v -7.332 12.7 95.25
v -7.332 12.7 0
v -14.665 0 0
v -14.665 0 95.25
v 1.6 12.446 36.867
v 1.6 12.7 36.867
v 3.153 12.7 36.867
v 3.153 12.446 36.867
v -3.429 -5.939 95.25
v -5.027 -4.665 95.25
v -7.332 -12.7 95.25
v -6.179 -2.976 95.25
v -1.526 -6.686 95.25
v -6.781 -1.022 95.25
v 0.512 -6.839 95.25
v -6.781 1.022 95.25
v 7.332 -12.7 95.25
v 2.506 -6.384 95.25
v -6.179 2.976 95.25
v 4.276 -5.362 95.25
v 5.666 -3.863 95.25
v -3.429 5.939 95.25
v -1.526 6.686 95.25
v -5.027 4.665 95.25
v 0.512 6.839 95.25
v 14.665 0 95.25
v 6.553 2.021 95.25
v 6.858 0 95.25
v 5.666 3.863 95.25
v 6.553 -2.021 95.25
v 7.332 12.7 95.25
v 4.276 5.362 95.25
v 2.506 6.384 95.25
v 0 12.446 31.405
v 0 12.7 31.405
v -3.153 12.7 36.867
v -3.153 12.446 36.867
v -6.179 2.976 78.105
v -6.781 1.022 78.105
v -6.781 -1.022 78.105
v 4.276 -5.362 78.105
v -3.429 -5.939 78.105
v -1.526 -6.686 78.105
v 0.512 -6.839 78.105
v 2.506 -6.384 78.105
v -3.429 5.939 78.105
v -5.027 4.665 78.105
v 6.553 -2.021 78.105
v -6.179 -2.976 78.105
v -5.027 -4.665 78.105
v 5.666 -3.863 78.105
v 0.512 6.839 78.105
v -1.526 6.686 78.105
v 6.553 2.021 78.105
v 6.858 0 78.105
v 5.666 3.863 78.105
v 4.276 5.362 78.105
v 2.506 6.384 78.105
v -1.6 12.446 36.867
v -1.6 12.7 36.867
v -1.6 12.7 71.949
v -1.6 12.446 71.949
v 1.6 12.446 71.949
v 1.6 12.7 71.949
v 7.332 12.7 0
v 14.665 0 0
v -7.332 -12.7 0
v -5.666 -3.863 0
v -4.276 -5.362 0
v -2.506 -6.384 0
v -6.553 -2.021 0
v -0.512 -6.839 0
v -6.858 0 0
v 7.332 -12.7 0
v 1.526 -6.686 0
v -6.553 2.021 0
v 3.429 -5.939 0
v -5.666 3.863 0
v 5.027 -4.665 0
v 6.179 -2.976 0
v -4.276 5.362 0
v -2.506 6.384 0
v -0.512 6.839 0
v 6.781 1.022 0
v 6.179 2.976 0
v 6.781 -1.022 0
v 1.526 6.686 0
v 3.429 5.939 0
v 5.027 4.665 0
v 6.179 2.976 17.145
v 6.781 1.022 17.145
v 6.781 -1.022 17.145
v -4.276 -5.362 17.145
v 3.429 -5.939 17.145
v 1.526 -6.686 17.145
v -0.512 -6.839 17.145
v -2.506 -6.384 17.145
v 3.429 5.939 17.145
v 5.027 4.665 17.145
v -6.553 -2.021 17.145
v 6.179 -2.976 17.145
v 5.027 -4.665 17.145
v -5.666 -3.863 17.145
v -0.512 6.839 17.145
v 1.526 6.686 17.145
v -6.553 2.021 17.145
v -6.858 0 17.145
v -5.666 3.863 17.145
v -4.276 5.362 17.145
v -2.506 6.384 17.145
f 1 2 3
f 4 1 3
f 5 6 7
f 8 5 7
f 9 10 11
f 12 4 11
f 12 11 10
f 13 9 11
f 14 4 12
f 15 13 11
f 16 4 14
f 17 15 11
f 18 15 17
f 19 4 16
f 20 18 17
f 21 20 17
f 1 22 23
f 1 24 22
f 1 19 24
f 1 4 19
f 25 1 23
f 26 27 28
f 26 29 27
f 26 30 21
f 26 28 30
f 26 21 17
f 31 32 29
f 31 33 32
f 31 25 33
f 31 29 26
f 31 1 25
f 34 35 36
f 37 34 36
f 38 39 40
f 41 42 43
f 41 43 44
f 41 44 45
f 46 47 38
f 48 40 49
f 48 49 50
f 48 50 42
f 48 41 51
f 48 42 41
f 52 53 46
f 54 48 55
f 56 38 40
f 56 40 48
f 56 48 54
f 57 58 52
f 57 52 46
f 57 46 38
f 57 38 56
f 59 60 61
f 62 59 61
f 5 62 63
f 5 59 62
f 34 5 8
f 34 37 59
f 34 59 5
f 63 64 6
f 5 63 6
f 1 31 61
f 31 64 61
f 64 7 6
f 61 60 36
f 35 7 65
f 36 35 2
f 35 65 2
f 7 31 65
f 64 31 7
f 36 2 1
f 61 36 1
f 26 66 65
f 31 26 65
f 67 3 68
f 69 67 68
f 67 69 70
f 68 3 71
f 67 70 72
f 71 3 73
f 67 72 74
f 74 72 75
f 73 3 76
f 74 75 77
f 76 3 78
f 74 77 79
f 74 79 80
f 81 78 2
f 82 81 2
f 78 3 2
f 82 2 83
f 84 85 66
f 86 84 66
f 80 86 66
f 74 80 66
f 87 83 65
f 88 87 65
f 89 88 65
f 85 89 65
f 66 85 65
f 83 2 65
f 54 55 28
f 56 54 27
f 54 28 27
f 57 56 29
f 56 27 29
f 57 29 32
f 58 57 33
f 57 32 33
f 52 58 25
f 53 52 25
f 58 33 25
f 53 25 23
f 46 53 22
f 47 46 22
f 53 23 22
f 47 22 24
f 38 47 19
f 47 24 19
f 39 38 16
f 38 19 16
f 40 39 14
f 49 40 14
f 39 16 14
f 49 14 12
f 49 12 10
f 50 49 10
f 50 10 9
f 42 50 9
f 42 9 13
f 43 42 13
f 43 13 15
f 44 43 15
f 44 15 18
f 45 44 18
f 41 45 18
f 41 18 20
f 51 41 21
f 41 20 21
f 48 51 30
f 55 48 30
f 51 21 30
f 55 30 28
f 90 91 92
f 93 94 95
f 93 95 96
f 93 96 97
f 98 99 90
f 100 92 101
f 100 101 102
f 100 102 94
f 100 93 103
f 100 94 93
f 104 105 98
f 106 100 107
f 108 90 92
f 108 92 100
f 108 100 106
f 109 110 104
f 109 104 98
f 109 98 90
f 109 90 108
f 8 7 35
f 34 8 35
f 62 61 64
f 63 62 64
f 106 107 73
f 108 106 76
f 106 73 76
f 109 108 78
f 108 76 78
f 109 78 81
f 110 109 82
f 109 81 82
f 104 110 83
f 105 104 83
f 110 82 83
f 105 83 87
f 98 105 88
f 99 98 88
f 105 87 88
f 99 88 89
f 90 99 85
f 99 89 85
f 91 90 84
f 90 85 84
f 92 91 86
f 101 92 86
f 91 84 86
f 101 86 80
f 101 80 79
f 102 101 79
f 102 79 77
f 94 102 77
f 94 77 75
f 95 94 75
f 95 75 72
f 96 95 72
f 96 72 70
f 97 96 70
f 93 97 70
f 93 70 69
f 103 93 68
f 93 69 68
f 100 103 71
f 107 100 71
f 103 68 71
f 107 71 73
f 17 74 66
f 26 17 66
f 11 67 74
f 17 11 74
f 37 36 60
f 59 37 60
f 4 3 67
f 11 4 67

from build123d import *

# Parameters (mm, degrees)
BOSS_EXTRUDE1_DEPTH = 95.25
SKETCH2_R           = 6.858
CUT_EXTRUDE1_DEPTH  = 17.145
SKETCH3_R           = 6.858
CUT_EXTRUDE2_DEPTH  = 17.145
CUT_EXTRUDE3_DEPTH  = 0.254


with BuildPart() as part:
    # Sketch1 → Boss-Extrude1 (new body)
    with BuildSketch(Plane.XY):
        Polygon((14.664696837, 0), (7.332348419, 12.7), (-7.332348419, 12.7), (-14.664696837, 0), (-7.332348419, -12.7), (7.332348419, -12.7), align=None)
    extrude(amount=BOSS_EXTRUDE1_DEPTH)

    # Sketch2 → Cut-Extrude1 (cut)
    with BuildSketch(Plane.XY.offset(95.25)):
        Circle(SKETCH2_R)
    extrude(amount=-CUT_EXTRUDE1_DEPTH, mode=Mode.SUBTRACT)

    # Sketch3 → Cut-Extrude2 (cut)
    with BuildSketch(Plane(origin=(0, 0, 0), x_dir=(-1, 0, 0), z_dir=(0, 0, -1))):
        Circle(SKETCH3_R)
    extrude(amount=-CUT_EXTRUDE2_DEPTH, mode=Mode.SUBTRACT)

    # Sketch5 → Cut-Extrude3 (cut)
    with BuildSketch(Plane(origin=(0, 12.7, 0), x_dir=(1, 0, 0), z_dir=(0, 1, 0))):
        Polygon((-1.600451542, -71.949067171), (1.600451542, -71.949067171), (1.600451542, -36.866567036), (3.153270171, -36.866567036), (0, -31.40494289), (-3.153270171, -36.866567036), (-1.600451542, -36.866567036), (-1.600451542, -42.196329226), align=None)
    extrude(amount=-CUT_EXTRUDE3_DEPTH, mode=Mode.SUBTRACT)


solid = part.part
